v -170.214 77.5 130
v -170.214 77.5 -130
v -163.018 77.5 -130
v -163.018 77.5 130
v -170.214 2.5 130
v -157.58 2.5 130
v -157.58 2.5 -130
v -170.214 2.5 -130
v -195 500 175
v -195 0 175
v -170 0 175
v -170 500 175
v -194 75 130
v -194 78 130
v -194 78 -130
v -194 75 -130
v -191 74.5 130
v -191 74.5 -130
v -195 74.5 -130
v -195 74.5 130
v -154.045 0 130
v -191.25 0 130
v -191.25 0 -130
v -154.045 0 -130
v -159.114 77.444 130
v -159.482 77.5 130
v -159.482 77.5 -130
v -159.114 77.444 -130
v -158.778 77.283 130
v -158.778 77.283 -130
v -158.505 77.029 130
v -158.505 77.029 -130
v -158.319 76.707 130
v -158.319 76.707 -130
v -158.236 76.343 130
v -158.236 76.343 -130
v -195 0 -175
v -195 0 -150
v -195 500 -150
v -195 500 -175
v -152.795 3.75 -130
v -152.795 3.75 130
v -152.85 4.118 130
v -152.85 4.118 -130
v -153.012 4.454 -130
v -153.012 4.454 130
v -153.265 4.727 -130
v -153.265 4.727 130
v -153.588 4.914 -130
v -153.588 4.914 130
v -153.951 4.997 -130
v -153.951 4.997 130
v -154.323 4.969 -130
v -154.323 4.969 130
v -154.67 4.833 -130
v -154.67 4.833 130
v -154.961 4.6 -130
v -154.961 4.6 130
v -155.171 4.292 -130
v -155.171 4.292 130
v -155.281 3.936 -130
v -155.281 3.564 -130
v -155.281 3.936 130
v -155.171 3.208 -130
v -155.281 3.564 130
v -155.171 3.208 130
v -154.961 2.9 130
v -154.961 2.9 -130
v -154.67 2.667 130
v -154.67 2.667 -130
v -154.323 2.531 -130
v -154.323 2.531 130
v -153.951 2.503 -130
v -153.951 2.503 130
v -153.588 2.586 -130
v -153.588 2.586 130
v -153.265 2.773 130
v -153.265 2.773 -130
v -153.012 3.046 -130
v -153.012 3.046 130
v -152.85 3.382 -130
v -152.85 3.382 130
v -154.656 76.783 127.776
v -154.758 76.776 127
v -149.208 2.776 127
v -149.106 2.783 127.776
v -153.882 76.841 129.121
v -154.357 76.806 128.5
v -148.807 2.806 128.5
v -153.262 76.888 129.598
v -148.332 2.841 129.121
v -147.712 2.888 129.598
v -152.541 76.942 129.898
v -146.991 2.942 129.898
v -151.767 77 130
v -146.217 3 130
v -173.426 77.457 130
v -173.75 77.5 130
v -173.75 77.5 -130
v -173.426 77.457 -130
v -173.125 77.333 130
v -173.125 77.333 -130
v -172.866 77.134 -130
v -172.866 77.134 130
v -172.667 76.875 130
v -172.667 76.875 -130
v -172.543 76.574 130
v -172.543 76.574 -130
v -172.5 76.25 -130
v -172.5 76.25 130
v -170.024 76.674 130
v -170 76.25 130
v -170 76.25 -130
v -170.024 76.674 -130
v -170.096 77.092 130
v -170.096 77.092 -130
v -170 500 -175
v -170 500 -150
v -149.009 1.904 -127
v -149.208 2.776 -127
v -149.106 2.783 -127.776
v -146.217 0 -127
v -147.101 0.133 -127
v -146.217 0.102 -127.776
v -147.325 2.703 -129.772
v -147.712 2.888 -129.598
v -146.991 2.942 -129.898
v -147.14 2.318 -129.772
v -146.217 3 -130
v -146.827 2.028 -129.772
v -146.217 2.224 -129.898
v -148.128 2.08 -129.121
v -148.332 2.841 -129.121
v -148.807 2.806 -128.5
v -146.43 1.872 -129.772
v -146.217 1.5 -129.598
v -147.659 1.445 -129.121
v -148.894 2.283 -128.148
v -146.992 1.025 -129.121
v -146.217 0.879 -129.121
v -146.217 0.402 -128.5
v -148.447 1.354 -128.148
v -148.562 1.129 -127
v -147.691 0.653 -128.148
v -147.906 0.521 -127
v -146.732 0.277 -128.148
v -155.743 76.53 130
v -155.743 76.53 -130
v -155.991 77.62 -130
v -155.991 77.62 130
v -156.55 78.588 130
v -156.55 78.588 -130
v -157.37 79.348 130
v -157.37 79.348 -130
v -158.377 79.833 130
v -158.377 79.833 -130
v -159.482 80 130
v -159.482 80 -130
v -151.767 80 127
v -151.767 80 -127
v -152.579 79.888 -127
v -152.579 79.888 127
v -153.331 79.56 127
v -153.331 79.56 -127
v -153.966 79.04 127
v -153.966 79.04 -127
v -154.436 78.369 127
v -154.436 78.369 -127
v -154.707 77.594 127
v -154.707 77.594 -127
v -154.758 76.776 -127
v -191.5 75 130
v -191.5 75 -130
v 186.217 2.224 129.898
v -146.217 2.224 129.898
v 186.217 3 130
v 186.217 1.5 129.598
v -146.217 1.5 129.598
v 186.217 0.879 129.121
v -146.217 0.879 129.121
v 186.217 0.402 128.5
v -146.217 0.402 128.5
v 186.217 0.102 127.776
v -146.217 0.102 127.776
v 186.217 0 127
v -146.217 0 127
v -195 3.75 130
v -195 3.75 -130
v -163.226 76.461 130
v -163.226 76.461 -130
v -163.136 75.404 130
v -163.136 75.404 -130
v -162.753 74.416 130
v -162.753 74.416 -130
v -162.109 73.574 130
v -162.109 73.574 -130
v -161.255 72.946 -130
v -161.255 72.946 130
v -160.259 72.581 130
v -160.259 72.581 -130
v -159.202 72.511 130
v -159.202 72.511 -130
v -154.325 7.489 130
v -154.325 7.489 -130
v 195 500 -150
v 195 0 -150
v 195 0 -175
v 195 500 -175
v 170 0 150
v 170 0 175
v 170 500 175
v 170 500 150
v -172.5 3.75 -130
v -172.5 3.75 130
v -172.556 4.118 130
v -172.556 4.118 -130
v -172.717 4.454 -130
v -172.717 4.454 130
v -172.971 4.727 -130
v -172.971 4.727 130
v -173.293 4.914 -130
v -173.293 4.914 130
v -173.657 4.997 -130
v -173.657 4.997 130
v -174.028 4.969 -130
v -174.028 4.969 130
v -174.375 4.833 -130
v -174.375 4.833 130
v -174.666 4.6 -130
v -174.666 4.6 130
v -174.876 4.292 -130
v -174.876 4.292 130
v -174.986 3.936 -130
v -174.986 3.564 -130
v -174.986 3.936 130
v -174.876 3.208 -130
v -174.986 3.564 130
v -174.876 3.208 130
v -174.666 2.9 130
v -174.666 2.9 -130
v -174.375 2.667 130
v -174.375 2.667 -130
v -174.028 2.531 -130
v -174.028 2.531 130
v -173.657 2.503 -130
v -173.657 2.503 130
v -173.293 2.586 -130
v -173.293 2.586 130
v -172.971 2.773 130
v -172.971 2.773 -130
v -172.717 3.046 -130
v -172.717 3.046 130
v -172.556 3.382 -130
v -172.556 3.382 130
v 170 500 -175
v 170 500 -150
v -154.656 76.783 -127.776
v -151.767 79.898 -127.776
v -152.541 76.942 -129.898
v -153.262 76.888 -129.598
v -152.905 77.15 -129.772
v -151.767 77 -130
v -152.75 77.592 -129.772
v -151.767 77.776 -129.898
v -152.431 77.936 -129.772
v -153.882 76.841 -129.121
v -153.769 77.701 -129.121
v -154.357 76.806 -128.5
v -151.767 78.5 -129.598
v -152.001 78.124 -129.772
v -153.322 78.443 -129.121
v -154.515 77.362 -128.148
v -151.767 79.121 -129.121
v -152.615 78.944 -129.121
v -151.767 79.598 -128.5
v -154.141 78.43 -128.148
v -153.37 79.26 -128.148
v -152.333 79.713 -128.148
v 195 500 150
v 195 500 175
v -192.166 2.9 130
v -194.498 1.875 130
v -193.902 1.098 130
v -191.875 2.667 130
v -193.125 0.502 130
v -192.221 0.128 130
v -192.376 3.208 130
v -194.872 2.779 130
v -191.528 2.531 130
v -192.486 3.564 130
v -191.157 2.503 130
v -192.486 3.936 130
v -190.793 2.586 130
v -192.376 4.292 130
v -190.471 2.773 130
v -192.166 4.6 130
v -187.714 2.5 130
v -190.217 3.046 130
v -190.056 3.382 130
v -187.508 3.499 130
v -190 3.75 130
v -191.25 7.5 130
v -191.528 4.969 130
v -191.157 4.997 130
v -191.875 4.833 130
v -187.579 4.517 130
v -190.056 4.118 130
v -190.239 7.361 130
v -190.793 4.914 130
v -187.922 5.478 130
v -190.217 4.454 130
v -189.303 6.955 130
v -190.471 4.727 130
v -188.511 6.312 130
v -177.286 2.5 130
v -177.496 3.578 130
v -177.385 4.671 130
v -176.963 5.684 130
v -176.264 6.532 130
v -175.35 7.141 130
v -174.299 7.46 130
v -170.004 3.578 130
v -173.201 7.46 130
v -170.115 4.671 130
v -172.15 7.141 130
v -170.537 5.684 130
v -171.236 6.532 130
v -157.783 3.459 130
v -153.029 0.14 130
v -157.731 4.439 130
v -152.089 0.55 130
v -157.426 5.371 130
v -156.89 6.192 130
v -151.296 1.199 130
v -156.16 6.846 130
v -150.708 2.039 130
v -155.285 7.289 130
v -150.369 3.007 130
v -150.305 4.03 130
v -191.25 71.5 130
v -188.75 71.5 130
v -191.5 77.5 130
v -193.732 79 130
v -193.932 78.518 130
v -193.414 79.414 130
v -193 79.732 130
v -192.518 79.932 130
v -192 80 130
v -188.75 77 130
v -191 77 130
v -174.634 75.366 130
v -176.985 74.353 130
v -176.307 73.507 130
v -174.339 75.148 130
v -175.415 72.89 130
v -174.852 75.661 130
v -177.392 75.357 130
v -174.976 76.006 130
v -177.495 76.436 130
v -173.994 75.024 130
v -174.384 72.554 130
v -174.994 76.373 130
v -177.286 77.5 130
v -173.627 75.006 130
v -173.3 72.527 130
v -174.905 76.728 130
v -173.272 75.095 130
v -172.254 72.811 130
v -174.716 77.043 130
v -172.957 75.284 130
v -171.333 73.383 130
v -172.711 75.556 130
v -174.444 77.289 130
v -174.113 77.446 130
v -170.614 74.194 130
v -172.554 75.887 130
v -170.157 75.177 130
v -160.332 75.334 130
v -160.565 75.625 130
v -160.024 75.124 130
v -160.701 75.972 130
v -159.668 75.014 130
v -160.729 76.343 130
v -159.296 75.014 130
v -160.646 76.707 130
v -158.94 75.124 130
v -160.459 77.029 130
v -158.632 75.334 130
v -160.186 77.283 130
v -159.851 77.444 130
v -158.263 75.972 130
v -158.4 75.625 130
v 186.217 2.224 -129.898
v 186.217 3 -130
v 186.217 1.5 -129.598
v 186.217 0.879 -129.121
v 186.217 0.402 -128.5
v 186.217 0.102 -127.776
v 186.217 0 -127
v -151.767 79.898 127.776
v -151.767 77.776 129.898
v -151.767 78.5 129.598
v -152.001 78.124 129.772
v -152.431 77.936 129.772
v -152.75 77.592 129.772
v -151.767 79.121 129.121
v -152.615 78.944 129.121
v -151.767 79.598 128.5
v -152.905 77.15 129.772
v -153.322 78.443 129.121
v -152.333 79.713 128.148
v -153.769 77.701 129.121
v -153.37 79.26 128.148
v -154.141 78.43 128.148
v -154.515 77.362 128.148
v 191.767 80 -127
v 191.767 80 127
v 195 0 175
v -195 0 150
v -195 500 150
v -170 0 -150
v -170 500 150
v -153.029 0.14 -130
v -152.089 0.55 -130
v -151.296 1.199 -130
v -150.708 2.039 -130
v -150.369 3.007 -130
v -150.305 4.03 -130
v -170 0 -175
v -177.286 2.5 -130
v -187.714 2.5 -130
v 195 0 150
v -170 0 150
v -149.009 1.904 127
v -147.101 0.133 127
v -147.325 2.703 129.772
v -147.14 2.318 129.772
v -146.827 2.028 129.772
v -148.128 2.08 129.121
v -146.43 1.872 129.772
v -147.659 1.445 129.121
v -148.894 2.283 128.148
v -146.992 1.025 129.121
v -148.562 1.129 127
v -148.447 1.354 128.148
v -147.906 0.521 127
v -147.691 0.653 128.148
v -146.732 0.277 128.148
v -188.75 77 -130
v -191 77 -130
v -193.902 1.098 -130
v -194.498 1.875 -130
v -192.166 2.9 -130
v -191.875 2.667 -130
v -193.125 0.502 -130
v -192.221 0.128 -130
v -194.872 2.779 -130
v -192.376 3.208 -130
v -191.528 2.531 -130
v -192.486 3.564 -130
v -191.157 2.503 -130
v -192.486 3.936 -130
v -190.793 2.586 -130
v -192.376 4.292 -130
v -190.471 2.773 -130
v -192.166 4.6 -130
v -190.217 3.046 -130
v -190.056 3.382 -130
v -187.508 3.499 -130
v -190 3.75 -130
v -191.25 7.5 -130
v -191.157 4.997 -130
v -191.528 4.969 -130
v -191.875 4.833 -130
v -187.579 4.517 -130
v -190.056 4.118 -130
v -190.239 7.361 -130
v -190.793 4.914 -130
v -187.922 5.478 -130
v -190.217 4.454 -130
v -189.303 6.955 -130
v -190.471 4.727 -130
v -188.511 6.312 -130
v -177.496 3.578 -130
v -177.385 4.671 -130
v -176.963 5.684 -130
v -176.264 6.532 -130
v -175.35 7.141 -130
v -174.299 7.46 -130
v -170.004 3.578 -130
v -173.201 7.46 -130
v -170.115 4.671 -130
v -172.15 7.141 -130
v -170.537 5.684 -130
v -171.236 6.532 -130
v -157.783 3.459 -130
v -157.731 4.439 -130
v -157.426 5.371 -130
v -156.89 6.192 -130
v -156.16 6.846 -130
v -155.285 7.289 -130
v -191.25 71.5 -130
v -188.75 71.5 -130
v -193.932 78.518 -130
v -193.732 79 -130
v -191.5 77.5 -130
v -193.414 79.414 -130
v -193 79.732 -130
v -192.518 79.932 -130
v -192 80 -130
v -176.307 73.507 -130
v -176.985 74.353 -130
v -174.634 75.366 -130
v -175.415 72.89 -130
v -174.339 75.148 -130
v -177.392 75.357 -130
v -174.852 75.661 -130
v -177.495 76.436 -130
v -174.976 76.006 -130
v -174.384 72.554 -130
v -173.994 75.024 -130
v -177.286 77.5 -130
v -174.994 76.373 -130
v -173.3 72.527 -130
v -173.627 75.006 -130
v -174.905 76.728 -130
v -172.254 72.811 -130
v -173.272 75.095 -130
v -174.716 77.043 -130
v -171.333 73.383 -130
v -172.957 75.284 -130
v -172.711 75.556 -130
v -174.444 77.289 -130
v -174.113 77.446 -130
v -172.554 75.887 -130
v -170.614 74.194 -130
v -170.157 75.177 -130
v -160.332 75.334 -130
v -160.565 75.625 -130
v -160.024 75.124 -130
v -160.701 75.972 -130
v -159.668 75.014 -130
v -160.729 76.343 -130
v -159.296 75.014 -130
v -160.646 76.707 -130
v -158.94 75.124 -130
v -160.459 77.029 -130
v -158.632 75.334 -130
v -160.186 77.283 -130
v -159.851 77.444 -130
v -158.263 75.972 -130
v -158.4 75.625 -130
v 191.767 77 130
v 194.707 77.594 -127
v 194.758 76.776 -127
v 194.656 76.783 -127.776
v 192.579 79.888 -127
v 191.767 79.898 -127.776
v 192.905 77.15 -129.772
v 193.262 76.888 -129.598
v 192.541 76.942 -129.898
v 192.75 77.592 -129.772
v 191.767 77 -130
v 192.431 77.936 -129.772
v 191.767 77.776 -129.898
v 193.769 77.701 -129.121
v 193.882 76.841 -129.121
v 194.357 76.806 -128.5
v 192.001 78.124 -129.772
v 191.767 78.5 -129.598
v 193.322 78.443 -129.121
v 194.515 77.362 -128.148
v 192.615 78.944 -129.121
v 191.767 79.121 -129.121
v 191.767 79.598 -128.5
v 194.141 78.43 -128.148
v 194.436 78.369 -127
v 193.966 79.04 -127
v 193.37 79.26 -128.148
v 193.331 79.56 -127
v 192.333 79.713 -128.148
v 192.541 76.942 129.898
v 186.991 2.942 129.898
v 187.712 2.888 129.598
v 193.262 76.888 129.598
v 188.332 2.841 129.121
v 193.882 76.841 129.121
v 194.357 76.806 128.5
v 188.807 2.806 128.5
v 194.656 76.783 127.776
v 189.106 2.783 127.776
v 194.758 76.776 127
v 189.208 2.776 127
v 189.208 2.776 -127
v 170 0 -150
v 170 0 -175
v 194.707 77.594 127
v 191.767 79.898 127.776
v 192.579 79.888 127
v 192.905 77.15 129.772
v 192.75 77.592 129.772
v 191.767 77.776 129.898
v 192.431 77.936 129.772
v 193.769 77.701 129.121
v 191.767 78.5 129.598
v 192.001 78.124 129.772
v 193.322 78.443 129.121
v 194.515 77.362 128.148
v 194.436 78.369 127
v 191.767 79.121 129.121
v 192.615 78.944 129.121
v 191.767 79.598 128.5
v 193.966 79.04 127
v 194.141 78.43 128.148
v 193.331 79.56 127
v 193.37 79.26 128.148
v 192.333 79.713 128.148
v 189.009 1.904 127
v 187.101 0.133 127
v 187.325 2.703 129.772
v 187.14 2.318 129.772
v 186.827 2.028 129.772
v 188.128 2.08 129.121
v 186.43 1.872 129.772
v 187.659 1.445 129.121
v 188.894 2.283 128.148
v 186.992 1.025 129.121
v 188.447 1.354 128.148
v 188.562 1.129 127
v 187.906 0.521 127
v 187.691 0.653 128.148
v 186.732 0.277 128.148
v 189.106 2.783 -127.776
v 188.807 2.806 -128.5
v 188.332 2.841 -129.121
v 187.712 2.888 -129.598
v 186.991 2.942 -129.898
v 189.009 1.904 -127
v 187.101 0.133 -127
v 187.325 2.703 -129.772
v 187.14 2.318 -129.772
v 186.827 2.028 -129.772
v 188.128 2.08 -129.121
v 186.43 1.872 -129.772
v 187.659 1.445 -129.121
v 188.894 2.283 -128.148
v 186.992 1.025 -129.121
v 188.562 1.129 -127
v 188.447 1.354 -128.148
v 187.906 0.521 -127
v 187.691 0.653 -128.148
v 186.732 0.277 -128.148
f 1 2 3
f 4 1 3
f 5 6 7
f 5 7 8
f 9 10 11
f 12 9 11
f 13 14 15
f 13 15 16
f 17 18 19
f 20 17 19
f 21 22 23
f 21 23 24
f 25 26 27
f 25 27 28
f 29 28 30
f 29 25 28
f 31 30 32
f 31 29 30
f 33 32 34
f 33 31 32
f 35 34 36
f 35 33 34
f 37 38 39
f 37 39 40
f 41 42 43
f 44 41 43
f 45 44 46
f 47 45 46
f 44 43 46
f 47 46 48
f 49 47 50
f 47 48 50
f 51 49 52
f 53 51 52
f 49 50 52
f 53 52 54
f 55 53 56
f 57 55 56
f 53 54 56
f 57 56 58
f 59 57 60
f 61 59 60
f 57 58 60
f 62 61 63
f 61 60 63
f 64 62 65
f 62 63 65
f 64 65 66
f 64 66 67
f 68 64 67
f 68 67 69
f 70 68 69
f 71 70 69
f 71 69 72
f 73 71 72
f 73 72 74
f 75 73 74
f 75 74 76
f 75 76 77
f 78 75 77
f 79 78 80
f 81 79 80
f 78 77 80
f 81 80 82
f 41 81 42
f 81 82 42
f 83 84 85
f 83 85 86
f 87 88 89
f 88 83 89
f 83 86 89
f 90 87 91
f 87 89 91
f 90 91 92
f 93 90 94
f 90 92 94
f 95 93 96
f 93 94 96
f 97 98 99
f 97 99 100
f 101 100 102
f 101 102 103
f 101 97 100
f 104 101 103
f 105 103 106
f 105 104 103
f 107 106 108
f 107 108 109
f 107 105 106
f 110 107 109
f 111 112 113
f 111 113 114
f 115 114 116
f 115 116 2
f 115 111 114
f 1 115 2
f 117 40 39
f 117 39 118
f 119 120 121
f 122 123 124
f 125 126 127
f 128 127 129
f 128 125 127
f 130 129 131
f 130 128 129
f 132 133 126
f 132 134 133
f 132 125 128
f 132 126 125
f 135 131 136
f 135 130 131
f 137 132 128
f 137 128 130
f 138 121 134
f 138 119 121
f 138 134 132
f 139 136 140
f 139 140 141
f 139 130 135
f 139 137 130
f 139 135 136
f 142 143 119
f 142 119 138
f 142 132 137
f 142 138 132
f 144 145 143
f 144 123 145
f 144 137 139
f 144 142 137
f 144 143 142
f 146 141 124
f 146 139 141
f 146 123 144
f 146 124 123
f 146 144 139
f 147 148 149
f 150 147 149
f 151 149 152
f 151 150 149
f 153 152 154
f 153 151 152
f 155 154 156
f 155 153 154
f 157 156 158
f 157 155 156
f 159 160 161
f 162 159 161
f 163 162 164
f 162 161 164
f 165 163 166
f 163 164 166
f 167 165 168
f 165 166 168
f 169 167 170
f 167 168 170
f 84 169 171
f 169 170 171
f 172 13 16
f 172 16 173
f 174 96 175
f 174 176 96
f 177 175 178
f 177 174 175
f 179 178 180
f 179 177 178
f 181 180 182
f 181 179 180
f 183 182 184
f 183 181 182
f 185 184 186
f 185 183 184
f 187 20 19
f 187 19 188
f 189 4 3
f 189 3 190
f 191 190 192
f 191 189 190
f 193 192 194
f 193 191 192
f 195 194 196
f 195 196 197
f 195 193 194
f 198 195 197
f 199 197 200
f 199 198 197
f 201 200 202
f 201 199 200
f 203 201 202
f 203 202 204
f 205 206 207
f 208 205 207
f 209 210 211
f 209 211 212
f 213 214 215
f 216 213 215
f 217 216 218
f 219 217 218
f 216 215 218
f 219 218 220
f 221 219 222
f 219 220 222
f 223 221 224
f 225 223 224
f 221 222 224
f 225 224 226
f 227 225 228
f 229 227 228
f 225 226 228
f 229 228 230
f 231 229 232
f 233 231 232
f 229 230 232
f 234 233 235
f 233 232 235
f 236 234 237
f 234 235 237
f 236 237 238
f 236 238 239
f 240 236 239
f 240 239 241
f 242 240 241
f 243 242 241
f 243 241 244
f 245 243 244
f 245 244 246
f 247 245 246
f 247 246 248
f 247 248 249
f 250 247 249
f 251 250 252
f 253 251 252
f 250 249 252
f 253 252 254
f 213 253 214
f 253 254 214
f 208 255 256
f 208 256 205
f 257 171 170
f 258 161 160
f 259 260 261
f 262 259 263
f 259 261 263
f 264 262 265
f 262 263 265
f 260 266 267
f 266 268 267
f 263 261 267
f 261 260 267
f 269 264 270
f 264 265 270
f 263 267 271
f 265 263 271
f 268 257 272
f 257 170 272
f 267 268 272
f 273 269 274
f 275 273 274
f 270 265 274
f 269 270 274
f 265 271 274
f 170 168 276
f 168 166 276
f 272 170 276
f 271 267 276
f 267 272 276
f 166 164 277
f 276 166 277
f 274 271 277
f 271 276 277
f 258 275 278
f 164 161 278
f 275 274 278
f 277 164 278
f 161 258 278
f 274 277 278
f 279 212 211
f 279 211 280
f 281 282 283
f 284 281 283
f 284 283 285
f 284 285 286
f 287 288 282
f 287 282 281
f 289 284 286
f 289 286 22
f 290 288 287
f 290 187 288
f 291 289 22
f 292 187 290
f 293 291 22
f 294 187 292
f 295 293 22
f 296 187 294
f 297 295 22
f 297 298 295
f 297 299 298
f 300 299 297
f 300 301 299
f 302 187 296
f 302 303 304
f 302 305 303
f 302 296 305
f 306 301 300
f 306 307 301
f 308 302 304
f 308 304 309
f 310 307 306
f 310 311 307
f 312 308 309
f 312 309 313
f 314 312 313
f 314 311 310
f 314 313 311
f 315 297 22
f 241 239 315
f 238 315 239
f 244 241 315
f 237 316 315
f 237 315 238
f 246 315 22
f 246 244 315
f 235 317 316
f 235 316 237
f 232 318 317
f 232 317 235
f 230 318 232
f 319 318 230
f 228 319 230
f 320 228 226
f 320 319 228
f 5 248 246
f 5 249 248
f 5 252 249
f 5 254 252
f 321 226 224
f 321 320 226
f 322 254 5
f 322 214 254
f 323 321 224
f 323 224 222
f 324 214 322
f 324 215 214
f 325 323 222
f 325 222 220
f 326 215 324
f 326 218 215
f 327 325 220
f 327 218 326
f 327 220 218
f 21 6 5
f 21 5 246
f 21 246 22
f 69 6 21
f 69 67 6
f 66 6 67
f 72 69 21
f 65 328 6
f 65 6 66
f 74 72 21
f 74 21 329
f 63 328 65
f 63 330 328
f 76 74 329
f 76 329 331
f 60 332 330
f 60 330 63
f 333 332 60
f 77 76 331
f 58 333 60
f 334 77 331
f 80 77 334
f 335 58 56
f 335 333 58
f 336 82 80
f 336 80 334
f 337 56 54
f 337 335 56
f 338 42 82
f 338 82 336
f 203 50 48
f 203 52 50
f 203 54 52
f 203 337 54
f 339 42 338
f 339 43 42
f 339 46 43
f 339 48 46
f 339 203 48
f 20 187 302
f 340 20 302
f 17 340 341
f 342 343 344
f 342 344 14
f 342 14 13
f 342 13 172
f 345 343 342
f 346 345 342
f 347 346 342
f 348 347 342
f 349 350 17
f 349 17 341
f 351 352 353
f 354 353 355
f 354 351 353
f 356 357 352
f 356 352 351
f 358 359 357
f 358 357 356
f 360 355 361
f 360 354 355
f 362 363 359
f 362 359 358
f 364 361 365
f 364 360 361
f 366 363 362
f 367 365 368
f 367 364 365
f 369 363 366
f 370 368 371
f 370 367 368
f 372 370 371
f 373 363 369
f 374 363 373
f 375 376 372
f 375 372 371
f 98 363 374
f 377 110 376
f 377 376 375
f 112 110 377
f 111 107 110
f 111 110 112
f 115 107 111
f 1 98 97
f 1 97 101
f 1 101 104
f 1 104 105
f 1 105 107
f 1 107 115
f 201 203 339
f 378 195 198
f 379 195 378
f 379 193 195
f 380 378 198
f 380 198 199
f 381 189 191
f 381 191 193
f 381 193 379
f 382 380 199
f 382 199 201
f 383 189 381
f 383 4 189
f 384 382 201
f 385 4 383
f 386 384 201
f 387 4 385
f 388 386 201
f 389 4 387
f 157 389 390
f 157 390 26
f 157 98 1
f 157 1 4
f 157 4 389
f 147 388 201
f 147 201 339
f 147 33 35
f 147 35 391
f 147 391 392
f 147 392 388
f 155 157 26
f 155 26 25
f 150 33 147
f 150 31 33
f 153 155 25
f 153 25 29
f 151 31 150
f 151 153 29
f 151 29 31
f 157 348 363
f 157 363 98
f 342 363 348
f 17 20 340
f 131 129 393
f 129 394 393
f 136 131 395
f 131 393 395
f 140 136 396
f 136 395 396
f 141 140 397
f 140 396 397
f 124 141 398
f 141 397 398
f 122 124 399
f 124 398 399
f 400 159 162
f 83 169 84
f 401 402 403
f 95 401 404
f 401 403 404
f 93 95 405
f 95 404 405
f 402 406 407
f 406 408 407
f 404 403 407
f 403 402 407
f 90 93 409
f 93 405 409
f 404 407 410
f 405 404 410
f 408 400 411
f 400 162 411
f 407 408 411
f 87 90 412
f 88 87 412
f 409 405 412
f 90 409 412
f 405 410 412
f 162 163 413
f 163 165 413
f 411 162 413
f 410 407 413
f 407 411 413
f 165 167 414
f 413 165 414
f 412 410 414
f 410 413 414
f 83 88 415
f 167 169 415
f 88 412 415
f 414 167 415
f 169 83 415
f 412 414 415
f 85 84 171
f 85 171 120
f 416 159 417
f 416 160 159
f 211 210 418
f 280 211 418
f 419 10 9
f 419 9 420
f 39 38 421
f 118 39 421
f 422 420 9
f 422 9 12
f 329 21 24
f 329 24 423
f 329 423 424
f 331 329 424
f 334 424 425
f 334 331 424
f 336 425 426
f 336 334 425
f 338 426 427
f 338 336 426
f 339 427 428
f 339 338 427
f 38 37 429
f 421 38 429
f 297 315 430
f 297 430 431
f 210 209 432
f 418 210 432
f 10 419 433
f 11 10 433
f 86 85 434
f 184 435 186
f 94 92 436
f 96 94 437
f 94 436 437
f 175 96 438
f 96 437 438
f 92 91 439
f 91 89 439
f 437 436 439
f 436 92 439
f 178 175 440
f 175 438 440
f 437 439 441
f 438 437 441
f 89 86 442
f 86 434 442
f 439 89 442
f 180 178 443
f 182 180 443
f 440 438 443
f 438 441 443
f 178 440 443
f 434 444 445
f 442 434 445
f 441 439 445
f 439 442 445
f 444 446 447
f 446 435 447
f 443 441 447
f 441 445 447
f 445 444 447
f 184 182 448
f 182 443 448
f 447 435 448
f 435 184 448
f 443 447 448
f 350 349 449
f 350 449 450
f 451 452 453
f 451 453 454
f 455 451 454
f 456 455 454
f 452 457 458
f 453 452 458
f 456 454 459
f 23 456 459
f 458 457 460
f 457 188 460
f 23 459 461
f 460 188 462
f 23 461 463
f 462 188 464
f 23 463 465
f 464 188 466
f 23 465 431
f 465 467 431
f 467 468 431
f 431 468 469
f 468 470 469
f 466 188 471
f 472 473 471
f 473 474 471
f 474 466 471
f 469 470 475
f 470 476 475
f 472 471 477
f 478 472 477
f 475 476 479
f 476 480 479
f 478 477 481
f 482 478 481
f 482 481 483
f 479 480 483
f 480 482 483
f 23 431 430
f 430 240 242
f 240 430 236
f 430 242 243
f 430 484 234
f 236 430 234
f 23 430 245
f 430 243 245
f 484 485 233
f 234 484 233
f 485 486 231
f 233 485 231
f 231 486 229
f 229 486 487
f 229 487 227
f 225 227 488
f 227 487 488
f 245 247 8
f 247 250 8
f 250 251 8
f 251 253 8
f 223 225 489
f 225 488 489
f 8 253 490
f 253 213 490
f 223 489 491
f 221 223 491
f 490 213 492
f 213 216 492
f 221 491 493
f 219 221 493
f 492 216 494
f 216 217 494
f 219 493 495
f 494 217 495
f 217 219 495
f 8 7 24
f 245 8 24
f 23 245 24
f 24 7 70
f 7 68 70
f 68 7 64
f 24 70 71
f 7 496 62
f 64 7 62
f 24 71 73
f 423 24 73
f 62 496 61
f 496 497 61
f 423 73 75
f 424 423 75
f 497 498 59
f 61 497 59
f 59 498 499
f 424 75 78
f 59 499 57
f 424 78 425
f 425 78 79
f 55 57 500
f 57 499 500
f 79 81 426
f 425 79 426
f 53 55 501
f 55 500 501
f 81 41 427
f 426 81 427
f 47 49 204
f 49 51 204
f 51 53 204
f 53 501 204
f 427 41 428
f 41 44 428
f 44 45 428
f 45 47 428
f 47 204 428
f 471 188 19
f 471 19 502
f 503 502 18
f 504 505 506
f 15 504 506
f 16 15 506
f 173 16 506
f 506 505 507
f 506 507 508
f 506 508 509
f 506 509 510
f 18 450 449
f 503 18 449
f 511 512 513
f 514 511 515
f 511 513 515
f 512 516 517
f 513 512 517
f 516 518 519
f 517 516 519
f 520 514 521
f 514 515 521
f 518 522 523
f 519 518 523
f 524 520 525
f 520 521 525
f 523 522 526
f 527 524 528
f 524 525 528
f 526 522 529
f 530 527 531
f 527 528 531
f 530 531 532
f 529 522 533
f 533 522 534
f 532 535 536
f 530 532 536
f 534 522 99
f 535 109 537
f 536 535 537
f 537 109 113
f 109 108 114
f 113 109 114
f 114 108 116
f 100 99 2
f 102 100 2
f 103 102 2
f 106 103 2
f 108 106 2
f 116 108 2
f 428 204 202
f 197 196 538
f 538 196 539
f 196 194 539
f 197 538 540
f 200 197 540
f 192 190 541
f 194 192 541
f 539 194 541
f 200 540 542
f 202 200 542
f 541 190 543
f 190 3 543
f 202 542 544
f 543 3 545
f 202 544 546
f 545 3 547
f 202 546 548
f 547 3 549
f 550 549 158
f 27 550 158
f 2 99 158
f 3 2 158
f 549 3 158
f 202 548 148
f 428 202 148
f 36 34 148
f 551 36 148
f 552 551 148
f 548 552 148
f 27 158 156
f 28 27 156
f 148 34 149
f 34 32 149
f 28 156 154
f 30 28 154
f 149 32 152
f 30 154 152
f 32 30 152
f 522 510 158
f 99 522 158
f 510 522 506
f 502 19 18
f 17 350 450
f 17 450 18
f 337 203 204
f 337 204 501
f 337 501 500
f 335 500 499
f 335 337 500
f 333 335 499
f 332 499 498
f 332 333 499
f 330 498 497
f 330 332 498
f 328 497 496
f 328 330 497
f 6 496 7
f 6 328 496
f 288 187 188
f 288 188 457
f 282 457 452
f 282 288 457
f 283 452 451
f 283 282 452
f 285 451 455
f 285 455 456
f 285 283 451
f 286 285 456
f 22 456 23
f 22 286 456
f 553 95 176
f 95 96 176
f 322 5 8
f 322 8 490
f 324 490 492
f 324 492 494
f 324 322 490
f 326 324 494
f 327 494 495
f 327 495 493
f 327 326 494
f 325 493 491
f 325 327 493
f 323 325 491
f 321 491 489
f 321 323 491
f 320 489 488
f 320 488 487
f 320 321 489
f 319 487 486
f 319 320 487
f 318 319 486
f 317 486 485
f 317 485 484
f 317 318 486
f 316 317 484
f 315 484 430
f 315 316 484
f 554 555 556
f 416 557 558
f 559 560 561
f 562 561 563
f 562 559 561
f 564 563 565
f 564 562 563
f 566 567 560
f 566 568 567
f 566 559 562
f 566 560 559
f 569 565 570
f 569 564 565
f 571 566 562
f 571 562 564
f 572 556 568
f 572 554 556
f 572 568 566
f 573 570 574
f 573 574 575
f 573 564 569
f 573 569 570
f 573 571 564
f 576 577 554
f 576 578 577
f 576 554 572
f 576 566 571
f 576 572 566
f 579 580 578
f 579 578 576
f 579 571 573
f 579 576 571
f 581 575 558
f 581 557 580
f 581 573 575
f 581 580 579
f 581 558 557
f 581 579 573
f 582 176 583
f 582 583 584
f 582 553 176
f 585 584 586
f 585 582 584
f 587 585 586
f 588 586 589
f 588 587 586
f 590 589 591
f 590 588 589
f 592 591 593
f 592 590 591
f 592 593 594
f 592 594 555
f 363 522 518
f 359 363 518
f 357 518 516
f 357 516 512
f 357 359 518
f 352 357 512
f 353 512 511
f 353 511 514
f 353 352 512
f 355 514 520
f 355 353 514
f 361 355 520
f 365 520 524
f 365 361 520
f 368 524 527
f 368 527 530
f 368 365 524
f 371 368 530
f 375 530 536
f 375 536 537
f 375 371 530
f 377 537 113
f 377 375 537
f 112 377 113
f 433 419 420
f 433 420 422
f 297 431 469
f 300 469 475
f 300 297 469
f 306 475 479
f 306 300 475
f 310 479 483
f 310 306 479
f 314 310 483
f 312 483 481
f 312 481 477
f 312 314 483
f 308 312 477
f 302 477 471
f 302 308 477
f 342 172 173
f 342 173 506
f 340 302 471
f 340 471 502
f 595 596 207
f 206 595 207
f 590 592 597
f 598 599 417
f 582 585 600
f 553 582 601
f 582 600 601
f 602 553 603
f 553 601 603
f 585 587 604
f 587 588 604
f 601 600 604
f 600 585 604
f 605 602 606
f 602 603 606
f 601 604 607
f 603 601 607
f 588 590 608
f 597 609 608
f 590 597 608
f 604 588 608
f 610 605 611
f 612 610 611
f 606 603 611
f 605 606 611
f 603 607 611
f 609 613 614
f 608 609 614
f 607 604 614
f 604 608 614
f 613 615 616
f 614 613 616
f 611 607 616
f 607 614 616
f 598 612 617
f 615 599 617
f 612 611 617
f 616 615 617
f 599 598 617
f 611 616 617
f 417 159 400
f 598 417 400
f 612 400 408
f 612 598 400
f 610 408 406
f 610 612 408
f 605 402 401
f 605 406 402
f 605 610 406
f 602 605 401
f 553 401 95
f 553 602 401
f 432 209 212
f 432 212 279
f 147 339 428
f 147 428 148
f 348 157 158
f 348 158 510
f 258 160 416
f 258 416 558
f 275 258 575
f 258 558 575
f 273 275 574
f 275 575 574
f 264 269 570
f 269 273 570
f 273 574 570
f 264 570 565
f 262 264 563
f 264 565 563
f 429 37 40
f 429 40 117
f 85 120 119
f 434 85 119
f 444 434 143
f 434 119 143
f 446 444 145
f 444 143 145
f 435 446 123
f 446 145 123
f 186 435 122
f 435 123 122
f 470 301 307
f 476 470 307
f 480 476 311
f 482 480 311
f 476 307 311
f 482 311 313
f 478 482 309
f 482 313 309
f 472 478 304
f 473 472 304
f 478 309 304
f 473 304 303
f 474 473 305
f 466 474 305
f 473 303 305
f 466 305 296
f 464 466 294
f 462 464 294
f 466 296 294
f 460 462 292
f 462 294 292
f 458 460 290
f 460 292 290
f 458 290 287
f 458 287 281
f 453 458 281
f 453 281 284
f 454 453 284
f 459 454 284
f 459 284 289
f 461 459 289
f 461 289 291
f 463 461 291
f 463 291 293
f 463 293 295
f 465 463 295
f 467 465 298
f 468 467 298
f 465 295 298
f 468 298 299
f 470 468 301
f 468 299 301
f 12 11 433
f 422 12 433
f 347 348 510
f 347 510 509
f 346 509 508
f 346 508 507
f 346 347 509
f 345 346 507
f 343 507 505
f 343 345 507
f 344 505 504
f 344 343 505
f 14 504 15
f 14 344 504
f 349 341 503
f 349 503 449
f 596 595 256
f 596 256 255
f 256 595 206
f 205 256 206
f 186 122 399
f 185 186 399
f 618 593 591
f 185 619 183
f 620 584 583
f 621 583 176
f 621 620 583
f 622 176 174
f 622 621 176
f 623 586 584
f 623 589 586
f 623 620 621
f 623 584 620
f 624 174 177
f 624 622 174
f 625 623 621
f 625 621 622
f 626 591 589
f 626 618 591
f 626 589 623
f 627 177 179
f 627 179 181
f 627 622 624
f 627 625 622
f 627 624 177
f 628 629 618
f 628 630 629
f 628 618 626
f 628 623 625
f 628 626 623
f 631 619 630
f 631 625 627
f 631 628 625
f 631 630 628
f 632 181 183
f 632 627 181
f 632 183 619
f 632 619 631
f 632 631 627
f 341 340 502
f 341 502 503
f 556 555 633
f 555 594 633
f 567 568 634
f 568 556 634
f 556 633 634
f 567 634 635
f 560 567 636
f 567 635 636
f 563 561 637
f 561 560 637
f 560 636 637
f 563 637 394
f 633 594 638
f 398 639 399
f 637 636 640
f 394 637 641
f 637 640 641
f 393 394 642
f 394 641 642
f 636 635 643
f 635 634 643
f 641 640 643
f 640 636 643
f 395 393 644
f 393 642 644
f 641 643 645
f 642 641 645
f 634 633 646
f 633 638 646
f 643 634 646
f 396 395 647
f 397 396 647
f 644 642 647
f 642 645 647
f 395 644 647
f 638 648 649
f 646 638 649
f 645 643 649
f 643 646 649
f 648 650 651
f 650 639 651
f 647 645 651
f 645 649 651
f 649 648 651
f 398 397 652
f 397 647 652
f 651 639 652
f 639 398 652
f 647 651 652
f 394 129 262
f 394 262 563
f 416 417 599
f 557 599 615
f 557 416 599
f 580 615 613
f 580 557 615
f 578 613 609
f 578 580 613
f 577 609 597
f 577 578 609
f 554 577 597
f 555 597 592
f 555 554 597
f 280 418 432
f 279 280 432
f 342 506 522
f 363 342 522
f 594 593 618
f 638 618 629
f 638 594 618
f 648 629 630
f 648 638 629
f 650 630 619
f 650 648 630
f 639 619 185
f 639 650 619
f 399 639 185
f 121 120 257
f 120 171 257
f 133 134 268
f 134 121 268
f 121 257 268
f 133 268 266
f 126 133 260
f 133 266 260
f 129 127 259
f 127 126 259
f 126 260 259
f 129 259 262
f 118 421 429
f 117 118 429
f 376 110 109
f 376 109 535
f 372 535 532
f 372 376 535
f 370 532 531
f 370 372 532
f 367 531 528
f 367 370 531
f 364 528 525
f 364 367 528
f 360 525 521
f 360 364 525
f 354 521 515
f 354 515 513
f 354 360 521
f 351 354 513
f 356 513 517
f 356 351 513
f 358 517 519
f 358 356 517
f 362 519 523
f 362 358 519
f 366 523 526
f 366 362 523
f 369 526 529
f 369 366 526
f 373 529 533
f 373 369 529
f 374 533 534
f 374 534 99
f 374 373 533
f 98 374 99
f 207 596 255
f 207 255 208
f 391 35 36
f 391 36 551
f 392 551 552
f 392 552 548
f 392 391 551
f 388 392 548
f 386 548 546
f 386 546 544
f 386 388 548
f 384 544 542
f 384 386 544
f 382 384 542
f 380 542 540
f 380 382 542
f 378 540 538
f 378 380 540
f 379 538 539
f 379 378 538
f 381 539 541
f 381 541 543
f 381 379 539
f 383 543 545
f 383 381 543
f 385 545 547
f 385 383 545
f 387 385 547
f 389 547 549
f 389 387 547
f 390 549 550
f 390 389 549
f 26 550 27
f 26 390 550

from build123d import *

# Parameters (mm, degrees)
SKETCH_1_W          = 350
SKETCH_1_H          = 260
EXTRUDE_5_DEPTH     = 80
CUT_EXTRUDE_1_DEPTH = 262
CUT_EXTRUDE_2_DEPTH = 262
FILLET_2_R          = 3
SKETCH_1_9_W        = 25
SKETCH_1_9_H        = 25
EXTRUDE_6_DEPTH     = 500
EXTRUDE_6_2_DEPTH   = 500
EXTRUDE_6_3_DEPTH   = 500
EXTRUDE_6_4_DEPTH   = 500
SKETCH_32_R         = 1.25
EXTRUDE_17_DEPTH    = 260
EXTRUDE_18_DEPTH    = 260


with BuildPart() as part:
    # 스케치1 → 보스-돌출5 (new body)
    with BuildSketch(Plane(origin=(0, 0, 0), x_dir=(1, 0, 0), z_dir=(0, 1, 0))):
        with Locations((20, 0)):
            Rectangle(SKETCH_1_W, SKETCH_1_H)
    extrude(amount=EXTRUDE_5_DEPTH)

    # 스케치5 → 컷-돌출1 (cut)
    with BuildSketch(Plane.XY.offset(130)):
        Polygon((-155, 80), (-149, 0), (-155, 0), align=None)
    extrude(amount=-CUT_EXTRUDE_1_DEPTH, mode=Mode.SUBTRACT)

    # 스케치6 → 컷-돌출2 (cut)
    with BuildSketch(Plane.XY.offset(130)):
        Polygon((195, 0), (189, 0), (195, 80), align=None)
    extrude(amount=-CUT_EXTRUDE_2_DEPTH, mode=Mode.SUBTRACT)

    # 필렛2
    fillet_2_edges = [part.edges().sort_by_distance(p)[0] for p in [
        (20, 80, 130),
        (195, 80, 0),
        (-149, 0, 0),
        (-152, 40, -130),
        (-152, 40, 130),
        (20, 0, 130),
        (20, 0, -130),
        (189, 0, 0),
        (192, 40, -130),
        (192, 40, 130),
        (20, 80, -130),
        (-155, 80, 0),
    ]]
    fillet(fillet_2_edges, radius=FILLET_2_R)


with BuildPart() as body_2:
    # 스케치1<9> → 보스-돌출6 (new body)
    with BuildSketch(Plane(origin=(0, 0, 0), x_dir=(1, 0, 0), z_dir=(0, 1, 0))):
        with Locations((-182.5, -162.5)):
            Rectangle(SKETCH_1_9_W, SKETCH_1_9_H)
    extrude(amount=EXTRUDE_6_DEPTH)


with BuildPart() as body_3:
    # 스케치1<9> → Extrude 6 2 (new body)
    with BuildSketch(Plane(origin=(0, 0, 0), x_dir=(1, 0, 0), z_dir=(0, 1, 0))):
        with Locations((182.5, -162.5)):
            Rectangle(SKETCH_1_9_W, SKETCH_1_9_H)
    extrude(amount=EXTRUDE_6_2_DEPTH)


with BuildPart() as body_4:
    # 스케치1<9> → Extrude 6 3 (new body)
    with BuildSketch(Plane(origin=(0, 0, 0), x_dir=(1, 0, 0), z_dir=(0, 1, 0))):
        with Locations((182.5, 162.5)):
            Rectangle(SKETCH_1_9_W, SKETCH_1_9_H)
    extrude(amount=EXTRUDE_6_3_DEPTH)


with BuildPart() as body_5:
    # 스케치1<9> → Extrude 6 4 (new body)
    with BuildSketch(Plane(origin=(0, 0, 0), x_dir=(1, 0, 0), z_dir=(0, 1, 0))):
        with Locations((-182.5, 162.5)):
            Rectangle(SKETCH_1_9_W, SKETCH_1_9_H)
    extrude(amount=EXTRUDE_6_4_DEPTH)


with BuildPart() as body_6:
    # 스케치32 → 보스-돌출17 (new body)
    with BuildSketch(Plane.XY.offset(130)):
        with BuildLine():
            ThreePointArc((-195, 3.75), (-193.901650429, 1.098349571), (-191.25, 0))
            Line((-191.25, 0), (-154.044590641, 0))
            ThreePointArc((-154.044590641, 0), (-151.295569575, 1.199434734), (-150.305093229, 4.030462306))
            Line((-150.305093229, 4.030462306), (-155.742593229, 76.530462306))
            Line((-155.742593229, 76.530462306), (-158.235591504, 76.343487435))
            ThreePointArc((-158.235591504, 76.343487435), (-160.332279063, 75.333659645), (-159.482090641, 77.5))
            Line((-159.482090641, 77.5), (-163.017624547, 77.5))
            ThreePointArc((-163.017624547, 77.5), (-162.460788995, 73.97187443), (-159.201628335, 72.510502588))
            Line((-159.201628335, 72.510502588), (-154.325052947, 7.489497412))
            ThreePointArc((-154.325052947, 7.489497412), (-157.185327478, 5.798968551), (-157.580124547, 2.5))
            Line((-157.580124547, 2.5), (-170.214466094, 2.5))
            ThreePointArc((-170.214466094, 2.5), (-173.75, 7.5), (-177.285533906, 2.5))
            Line((-177.285533906, 2.5), (-187.714466094, 2.5))
            ThreePointArc((-187.714466094, 2.5), (-188.188137822, 5.915063509), (-191.25, 7.5))
            Line((-191.25, 7.5), (-191.25, 71.5))
            Line((-191.25, 71.5), (-188.75, 71.5))
            Line((-188.75, 71.5), (-188.75, 77))
            Line((-188.75, 77), (-191, 77))
            Line((-191, 77), (-191, 74.5))
            Line((-191, 74.5), (-195, 74.5))
            Line((-195, 74.5), (-195, 3.75))
        make_face()
        with Locations((-154.044590641, 3.75)):
            Circle(SKETCH_32_R, mode=Mode.SUBTRACT)
        with Locations((-191.25, 3.75)):
            Circle(SKETCH_32_R, mode=Mode.SUBTRACT)
        with Locations((-173.75, 3.75)):
            Circle(SKETCH_32_R, mode=Mode.SUBTRACT)
    extrude(amount=-EXTRUDE_17_DEPTH)

    # 스케치32<7> → 보스-돌출18 (add)
    with BuildSketch(Plane.XY.offset(130)):
        with BuildLine():
            Line((-158.235591504, 76.343487435), (-155.742593229, 76.530462306))
            ThreePointArc((-155.742593229, 76.530462306), (-156.931525375, 78.999021066), (-159.482090641, 80))
            Line((-159.482090641, 80), (-159.482090641, 77.5))
            ThreePointArc((-159.482090641, 77.5), (-158.631902219, 77.166340355), (-158.235591504, 76.343487435))
        make_face()
        with BuildLine():
            Line((-159.482090641, 77.5), (-159.482090641, 80))
            ThreePointArc((-159.482090641, 80), (-161.64715415, 79.311862178), (-163.017624547, 77.5))
            Line((-163.017624547, 77.5), (-159.482090641, 77.5))
        make_face()
        with BuildLine():
            Line((-159.482090641, 80), (-173.75, 80))
            ThreePointArc((-173.75, 80), (-171.584936491, 79.311862178), (-170.214466094, 77.5))
            Line((-170.214466094, 77.5), (-163.017624547, 77.5))
            ThreePointArc((-163.017624547, 77.5), (-161.64715415, 79.311862178), (-159.482090641, 80))
        make_face()
        with BuildLine():
            ThreePointArc((-170.214466094, 77.5), (-171.584936491, 79.311862178), (-173.75, 80))
            ThreePointArc((-173.75, 80), (-175.915063509, 79.311862178), (-177.285533906, 77.5))
            Line((-177.285533906, 77.5), (-173.75, 77.5))
            Line((-173.75, 77.5), (-170.214466094, 77.5))
        make_face()
        with BuildLine():
            ThreePointArc((-170, 76.25), (-170.054005401, 76.88413242), (-170.214466094, 77.5))
            Line((-170.214466094, 77.5), (-173.75, 77.5))
            Line((-173.75, 77.5), (-177.285533906, 77.5))
            ThreePointArc((-177.285533906, 77.5), (-174.38413242, 72.554005401), (-170, 76.25))
        make_face()
        with BuildLine():
            ThreePointArc((-172.5, 76.25), (-174.633883476, 75.366116524), (-173.75, 77.5))
            ThreePointArc((-173.75, 77.5), (-172.866116524, 77.133883476), (-172.5, 76.25))
        make_face(mode=Mode.SUBTRACT)
        with BuildLine():
            Line((-191.530628811, 80), (-192, 80))
            ThreePointArc((-192, 80), (-193.414213562, 79.414213562), (-194, 78))
            Line((-194, 78), (-194, 77))
            Line((-194, 77), (-194, 75))
            Line((-194, 75), (-191.5, 75))
            Line((-191.5, 75), (-191.5, 77.5))
            Line((-191.5, 77.5), (-190.549934157, 77.5))
            Line((-190.549934157, 77.5), (-177.285533906, 77.5))
            ThreePointArc((-177.285533906, 77.5), (-175.915063509, 79.311862178), (-173.75, 80))
            Line((-173.75, 80), (-191.25, 80))
            Line((-191.25, 80), (-191.530628811, 80))
        make_face()
    extrude(amount=-EXTRUDE_18_DEPTH)


solid = Compound([part.part, body_2.part, body_3.part, body_4.part, body_5.part, body_6.part])
